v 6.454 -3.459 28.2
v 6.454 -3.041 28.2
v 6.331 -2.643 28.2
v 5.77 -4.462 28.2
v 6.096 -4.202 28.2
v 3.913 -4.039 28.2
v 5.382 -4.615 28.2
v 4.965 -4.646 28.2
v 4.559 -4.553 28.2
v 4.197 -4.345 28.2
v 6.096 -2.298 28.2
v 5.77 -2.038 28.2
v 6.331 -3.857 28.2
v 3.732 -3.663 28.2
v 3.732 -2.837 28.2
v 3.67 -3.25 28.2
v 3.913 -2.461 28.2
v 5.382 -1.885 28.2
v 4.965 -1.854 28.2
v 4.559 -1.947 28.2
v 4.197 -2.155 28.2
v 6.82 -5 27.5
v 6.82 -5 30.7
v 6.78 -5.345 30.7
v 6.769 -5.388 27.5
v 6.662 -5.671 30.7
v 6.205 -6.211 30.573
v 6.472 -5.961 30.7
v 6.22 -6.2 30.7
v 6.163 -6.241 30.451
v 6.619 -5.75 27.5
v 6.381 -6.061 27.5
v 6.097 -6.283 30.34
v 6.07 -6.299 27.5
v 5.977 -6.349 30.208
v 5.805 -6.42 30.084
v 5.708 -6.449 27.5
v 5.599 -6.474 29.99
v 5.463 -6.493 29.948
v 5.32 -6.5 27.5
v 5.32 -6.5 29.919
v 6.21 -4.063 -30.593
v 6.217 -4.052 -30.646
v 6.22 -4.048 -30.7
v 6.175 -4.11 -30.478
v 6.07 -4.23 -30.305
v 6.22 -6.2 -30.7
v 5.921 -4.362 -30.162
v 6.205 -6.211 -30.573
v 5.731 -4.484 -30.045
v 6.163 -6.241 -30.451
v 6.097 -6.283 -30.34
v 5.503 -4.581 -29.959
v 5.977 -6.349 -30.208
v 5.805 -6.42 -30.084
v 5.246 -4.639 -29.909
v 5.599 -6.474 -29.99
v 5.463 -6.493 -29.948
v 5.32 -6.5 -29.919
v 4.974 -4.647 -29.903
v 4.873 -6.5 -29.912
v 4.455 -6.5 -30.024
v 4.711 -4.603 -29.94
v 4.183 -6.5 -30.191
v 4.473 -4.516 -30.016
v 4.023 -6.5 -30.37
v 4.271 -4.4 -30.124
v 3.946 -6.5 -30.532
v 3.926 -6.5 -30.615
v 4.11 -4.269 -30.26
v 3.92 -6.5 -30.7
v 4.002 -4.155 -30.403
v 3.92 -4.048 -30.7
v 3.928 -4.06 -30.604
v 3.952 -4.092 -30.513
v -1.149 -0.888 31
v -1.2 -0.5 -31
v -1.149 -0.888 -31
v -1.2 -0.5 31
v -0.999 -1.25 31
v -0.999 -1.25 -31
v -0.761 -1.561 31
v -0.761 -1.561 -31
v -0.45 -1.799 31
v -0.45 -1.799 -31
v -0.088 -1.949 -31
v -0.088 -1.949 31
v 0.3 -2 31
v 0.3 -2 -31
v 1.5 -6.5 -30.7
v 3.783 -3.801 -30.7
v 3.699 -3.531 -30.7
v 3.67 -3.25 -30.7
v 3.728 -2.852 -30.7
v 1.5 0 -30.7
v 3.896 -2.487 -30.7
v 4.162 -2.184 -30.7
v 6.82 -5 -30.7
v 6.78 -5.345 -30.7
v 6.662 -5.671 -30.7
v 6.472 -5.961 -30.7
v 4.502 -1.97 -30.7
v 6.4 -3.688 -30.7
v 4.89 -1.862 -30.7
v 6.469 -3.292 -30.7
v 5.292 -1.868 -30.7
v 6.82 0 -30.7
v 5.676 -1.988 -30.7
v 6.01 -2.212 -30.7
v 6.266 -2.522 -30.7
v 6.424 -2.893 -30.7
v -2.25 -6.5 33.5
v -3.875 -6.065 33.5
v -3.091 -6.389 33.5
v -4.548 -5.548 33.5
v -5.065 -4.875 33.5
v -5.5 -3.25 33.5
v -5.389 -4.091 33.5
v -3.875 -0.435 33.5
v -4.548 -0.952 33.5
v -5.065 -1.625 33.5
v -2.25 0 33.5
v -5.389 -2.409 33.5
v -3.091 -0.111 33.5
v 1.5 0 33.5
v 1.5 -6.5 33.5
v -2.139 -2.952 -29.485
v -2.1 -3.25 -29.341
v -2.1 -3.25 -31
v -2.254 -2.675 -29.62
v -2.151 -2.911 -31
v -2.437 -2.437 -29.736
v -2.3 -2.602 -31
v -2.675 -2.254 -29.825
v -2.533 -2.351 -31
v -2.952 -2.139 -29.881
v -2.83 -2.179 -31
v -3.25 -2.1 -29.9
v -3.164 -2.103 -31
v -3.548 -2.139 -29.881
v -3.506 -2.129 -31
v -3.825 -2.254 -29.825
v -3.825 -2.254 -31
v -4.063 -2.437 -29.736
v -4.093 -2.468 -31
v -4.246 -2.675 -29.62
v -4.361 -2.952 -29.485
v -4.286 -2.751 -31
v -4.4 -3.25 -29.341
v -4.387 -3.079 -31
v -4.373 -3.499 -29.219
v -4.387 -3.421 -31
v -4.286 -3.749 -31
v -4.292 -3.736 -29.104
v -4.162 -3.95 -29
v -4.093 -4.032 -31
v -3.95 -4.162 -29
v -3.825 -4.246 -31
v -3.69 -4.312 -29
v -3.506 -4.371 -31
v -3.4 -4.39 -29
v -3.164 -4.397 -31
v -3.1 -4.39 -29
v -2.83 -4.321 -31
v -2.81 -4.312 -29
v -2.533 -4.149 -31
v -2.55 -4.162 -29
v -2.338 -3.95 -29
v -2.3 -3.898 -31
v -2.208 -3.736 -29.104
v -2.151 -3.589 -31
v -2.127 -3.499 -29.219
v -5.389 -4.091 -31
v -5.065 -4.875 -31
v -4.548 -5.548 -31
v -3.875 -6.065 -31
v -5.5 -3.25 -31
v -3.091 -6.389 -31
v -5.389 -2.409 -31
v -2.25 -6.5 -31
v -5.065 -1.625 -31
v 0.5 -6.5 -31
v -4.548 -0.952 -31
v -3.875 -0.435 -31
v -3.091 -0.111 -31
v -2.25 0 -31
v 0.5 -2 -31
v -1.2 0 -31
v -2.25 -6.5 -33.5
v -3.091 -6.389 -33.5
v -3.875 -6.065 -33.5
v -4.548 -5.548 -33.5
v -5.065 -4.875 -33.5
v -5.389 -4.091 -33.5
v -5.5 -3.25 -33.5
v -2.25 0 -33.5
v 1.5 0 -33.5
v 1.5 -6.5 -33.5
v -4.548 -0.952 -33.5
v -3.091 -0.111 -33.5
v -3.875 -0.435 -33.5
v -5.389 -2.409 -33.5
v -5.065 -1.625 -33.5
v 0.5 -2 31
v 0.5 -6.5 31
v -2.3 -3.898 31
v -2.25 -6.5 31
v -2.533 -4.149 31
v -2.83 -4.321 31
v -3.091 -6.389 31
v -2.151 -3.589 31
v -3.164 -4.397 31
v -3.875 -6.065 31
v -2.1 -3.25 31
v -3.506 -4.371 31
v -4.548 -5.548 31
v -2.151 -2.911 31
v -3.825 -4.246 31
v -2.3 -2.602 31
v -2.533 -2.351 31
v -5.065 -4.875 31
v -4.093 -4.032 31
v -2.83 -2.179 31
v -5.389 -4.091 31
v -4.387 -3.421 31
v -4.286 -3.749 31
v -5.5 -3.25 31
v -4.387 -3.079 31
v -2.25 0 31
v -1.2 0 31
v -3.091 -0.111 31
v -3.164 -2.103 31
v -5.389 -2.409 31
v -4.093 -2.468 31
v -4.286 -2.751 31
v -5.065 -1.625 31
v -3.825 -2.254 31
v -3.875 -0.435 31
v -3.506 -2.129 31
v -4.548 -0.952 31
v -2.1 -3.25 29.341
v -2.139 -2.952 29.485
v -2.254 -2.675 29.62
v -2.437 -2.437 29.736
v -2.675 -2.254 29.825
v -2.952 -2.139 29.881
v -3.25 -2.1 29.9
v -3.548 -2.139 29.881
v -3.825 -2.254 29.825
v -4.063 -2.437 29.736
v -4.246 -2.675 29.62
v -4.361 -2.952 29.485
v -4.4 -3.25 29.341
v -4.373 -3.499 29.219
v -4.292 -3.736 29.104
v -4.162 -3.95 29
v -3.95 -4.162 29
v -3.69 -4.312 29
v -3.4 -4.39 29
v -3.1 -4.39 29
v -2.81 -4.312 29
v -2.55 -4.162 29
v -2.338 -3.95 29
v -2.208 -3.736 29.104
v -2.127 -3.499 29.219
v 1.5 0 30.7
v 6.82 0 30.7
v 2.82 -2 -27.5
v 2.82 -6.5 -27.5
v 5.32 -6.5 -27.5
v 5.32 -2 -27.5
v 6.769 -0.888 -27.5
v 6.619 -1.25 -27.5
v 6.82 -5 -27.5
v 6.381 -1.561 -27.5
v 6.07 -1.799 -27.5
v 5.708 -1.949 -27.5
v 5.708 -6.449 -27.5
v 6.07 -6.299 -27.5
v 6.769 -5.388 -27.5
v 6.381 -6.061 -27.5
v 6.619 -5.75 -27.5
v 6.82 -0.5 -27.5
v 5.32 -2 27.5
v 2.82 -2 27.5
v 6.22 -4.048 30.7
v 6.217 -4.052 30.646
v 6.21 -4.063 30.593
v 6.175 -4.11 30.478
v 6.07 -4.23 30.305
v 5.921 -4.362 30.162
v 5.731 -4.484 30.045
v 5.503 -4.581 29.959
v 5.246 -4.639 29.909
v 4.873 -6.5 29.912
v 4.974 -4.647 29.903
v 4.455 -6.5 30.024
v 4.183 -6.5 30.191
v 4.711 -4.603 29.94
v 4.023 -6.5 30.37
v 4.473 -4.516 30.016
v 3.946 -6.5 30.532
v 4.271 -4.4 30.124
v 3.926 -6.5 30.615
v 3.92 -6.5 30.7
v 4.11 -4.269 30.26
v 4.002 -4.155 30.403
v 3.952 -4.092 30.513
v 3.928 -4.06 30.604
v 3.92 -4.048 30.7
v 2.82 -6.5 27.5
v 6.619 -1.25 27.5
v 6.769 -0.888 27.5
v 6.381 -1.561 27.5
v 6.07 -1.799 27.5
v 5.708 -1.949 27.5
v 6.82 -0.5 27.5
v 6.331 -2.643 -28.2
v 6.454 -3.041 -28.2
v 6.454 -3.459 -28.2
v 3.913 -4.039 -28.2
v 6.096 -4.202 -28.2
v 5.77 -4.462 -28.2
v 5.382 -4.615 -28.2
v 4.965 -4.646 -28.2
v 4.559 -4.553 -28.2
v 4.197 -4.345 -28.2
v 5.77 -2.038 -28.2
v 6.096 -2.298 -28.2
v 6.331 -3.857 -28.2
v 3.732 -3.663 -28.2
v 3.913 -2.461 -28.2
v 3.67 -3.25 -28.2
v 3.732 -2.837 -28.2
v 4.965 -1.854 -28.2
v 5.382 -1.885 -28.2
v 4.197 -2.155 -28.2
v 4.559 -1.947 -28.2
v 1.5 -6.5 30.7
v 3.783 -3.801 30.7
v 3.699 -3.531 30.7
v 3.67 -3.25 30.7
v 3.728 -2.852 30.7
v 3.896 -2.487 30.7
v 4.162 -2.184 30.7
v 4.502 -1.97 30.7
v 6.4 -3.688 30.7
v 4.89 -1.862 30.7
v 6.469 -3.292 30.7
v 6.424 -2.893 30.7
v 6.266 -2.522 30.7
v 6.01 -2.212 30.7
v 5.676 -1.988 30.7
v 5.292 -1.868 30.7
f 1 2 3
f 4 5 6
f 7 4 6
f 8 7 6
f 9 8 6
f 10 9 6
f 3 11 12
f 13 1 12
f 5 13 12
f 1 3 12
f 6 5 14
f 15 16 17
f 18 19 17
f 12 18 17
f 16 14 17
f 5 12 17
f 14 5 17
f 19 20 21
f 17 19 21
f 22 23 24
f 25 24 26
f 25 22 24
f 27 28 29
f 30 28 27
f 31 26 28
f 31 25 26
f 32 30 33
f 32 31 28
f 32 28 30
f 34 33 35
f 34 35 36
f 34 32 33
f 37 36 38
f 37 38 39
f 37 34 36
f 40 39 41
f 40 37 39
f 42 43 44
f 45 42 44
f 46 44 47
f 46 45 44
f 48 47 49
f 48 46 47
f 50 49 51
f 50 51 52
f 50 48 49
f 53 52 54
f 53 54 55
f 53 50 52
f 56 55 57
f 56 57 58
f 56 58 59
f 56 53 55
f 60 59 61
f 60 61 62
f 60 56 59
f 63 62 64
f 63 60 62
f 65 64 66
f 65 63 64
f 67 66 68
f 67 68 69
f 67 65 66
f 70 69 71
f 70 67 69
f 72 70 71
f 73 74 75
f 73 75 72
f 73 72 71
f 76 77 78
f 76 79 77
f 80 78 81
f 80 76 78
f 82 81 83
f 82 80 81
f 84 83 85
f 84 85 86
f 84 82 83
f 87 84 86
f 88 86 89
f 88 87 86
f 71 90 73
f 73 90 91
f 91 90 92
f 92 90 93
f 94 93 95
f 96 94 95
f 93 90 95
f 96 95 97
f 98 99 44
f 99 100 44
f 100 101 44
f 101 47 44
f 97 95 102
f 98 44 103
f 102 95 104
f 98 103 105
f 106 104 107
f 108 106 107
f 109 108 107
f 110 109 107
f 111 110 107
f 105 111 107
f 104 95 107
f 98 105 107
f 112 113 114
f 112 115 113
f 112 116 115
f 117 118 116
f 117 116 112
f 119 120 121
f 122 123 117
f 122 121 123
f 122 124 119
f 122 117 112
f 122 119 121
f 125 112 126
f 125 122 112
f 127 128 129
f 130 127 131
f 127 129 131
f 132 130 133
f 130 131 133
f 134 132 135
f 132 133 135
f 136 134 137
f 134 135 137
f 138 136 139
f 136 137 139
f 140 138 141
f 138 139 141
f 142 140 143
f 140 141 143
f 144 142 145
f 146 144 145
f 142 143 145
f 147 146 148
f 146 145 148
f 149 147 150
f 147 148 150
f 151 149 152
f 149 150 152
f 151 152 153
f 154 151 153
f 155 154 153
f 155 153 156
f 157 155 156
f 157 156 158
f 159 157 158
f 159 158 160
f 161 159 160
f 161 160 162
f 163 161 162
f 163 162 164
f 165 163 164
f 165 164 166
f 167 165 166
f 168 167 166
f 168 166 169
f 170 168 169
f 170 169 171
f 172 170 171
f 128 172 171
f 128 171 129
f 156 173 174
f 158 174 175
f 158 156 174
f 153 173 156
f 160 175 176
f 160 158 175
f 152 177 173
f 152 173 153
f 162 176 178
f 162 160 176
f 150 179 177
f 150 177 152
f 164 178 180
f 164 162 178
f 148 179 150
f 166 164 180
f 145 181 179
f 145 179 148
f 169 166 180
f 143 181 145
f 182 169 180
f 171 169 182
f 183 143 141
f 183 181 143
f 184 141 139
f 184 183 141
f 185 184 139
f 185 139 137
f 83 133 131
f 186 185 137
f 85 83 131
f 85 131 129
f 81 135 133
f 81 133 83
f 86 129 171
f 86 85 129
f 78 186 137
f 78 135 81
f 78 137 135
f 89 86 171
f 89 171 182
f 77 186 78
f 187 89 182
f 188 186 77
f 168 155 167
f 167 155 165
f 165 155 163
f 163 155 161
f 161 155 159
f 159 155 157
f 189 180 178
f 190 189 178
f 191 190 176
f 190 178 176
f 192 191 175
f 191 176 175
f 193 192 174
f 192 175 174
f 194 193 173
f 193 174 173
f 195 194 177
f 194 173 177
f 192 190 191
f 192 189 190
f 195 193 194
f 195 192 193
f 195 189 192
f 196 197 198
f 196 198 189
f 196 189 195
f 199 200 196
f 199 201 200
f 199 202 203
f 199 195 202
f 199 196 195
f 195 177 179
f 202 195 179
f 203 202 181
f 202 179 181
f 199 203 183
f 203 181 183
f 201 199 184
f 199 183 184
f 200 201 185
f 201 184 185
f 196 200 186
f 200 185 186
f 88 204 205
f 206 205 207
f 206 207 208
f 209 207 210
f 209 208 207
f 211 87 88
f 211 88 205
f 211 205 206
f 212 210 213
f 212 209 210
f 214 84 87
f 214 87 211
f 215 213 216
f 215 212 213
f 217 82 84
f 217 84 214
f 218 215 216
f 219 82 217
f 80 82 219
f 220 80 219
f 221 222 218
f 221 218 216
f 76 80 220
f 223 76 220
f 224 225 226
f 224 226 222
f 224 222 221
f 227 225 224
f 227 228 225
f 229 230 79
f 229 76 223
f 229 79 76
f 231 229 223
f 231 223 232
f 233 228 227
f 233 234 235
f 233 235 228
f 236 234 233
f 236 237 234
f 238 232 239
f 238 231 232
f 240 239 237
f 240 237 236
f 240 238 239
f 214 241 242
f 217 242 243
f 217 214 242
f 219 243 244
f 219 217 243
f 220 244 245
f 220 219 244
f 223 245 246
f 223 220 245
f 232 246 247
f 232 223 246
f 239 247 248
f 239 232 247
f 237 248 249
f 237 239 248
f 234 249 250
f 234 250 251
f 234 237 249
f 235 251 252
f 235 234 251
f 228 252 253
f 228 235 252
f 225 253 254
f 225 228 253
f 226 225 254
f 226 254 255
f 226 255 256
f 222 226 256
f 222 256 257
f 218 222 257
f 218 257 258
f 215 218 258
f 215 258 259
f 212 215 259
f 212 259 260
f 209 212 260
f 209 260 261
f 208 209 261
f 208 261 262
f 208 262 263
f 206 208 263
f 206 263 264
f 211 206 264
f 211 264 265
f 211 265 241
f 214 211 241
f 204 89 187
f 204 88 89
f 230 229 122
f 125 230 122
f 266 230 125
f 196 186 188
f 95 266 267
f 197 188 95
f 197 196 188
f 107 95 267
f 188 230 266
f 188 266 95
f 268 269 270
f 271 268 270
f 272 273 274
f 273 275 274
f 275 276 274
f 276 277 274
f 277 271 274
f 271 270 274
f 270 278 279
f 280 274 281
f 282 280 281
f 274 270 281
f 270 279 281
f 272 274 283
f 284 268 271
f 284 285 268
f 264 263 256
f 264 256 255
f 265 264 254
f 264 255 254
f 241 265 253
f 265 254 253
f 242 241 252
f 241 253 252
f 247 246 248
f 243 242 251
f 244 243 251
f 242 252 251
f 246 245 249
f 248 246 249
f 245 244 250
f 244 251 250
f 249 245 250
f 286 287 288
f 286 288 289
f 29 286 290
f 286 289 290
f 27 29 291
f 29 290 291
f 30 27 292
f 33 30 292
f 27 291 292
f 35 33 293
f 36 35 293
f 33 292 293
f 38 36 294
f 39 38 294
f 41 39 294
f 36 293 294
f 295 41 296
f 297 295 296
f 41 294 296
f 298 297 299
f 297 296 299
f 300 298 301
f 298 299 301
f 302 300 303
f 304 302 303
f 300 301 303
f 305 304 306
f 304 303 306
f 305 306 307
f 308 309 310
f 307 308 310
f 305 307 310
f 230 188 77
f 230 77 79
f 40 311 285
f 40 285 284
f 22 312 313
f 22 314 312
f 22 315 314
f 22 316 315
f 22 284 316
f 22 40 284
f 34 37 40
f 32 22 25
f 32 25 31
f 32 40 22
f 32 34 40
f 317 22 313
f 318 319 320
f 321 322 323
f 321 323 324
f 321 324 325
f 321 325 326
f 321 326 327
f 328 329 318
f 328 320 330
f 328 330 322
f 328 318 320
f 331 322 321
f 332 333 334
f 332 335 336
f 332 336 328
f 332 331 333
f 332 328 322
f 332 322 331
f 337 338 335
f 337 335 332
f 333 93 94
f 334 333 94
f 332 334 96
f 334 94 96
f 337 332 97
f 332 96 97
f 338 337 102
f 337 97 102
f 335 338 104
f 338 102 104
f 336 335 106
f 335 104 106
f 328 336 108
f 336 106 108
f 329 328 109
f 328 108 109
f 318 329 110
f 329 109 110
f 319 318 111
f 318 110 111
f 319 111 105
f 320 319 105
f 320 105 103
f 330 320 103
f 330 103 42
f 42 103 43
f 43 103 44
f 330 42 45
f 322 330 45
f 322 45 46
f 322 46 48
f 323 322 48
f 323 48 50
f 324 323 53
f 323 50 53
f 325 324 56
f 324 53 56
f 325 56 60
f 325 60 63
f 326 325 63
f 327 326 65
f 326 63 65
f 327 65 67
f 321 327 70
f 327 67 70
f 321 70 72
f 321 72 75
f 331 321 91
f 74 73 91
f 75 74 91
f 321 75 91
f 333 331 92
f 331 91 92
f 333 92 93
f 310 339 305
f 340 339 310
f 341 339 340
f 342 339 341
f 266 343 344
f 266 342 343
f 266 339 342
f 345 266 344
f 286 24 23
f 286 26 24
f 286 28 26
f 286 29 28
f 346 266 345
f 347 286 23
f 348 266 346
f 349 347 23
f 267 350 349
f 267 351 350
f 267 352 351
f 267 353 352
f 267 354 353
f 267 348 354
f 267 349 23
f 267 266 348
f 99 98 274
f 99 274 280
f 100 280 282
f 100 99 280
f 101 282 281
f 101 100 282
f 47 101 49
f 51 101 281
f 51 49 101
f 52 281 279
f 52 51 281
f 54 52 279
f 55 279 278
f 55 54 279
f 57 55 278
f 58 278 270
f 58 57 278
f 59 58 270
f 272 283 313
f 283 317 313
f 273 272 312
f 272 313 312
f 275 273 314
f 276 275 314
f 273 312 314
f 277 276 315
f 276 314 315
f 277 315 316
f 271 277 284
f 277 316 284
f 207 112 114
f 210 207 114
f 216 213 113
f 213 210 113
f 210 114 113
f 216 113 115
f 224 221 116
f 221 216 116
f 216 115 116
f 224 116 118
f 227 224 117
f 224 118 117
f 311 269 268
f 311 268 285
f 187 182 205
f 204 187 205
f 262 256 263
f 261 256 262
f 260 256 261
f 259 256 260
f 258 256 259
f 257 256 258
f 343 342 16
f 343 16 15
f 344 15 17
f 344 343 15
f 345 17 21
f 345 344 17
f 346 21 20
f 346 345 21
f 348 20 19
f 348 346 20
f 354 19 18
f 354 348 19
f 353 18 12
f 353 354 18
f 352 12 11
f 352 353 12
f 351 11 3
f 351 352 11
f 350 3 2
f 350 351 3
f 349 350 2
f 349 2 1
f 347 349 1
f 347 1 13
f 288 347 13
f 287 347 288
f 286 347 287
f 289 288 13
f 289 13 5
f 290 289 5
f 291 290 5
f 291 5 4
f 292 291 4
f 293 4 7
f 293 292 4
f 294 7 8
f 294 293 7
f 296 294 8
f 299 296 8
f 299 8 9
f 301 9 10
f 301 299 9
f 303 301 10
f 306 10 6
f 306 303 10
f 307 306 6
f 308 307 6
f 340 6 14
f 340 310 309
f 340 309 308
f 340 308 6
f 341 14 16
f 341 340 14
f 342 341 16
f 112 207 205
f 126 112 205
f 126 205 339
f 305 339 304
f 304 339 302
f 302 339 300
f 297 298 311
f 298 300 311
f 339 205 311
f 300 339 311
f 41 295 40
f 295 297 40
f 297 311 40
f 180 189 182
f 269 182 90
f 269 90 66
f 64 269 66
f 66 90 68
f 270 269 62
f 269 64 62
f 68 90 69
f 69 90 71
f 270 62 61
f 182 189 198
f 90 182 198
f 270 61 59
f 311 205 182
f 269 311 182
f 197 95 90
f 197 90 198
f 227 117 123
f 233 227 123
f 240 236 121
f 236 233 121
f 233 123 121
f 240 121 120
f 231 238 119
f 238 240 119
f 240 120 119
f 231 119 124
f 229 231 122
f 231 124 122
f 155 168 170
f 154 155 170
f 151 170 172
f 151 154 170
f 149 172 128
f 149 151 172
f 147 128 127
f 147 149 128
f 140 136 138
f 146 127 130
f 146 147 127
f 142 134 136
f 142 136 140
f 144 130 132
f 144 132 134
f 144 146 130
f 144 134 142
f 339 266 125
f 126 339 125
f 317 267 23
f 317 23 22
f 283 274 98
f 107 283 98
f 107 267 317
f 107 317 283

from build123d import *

# Parameters (mm, degrees)
BOSS_EXTRUDE1_DEPTH = 6.5
CUT_EXTRUDE3_DEPTH  = 68.659163459
SKETCH4_W           = 4
SKETCH4_H           = 55
SKETCH4_W_2         = 1.7
SKETCH4_H_2         = 62
CUT_EXTRUDE4_DEPTH  = 4.5
SKETCH5_R           = 1.15
BOSS_EXTRUDE2_DEPTH = 2
FILLET1_R           = 1.5
CUT_EXTRUDE5_REACH  = 36.8
SKETCH7_W           = 5.32
SKETCH7_H           = 0.3
SKETCH6_R           = 1.4
CUT_EXTRUDE6_DEPTH  = 2.8
FILLET2_R           = 1.5
FILLET3_R           = 1.5
CUT_EXTRUDE7_REACH  = 37.922
CUT_EXTRUDE8_START  = -2.451564
SKETCH10_RX         = 1.15
SKETCH10_RY         = 0.8
CUT_EXTRUDE8_DEPTH  = 2.451564


with BuildPart() as part:
    # Sketch1 → Boss-Extrude1 (new body)
    with BuildSketch(Plane(origin=(0, 0, 0), x_dir=(1, 0, 0), z_dir=(0, 1, 0))):
        Polygon((1.5, -31), (6.82, -31), (6.82, 31), (1.5, 31), (1.5, 33.5), (-5.5, 33.5), (-5.5, 31), (-1.2, 31), (-1.2, -31), (-5.5, -31), (-5.5, -33.5), (1.5, -33.5), align=None)
    extrude(amount=-BOSS_EXTRUDE1_DEPTH)

    # Sketch3 → Cut-Extrude3 (cut, through all)
    with BuildSketch(Plane.XY.offset(33.5)):
        with BuildLine():
            Line((-5.5, 0), (-5.5, -3.25))
            ThreePointArc((-5.5, -3.25), (-4.548097039, -0.951902961), (-2.25, 0))
            Line((-2.25, 0), (-5.5, 0))
        make_face()
        with BuildLine():
            Line((-5.5, -6.5), (-2.25, -6.5))
            ThreePointArc((-2.25, -6.5), (-4.548097039, -5.548097039), (-5.5, -3.25))
            Line((-5.5, -3.25), (-5.5, -6.5))
        make_face()
    extrude(amount=-CUT_EXTRUDE3_DEPTH, mode=Mode.SUBTRACT)

    # Sketch4 → Cut-Extrude4 (cut)
    with BuildSketch(Plane.XZ.offset(6.5)):
        with Locations((4.82, 0)):
            Rectangle(SKETCH4_W, SKETCH4_H)
        with Locations((-0.35, 0)):
            Rectangle(SKETCH4_W_2, SKETCH4_H_2)
    extrude(amount=-CUT_EXTRUDE4_DEPTH, mode=Mode.SUBTRACT)

    # Sketch5 → Boss-Extrude2 (add)
    with BuildSketch(Plane.XY.offset(-31)):
        with Locations((-3.25, -3.25)):
            Circle(SKETCH5_R)
    boss_extrude2 = extrude(amount=BOSS_EXTRUDE2_DEPTH)

    # Fillet1
    fillet1_edges = [part.edges().sort_by_distance(p)[0] for p in [
        (-1.2, -2, 0),
    ]]
    fillet(fillet1_edges, radius=FILLET1_R)

    # Sketch7 → Cut-Extrude5 (cut, up to next)
    with BuildSketch(Plane(origin=(0, 0, 0), x_dir=(1, 0, 0), z_dir=(0, 1, 0)), mode=Mode.PRIVATE) as cut_extrude5_sk1:
        with Locations((4.16, 30.85)):
            Rectangle(SKETCH7_W, SKETCH7_H)
    cut_extrude5_tool1 = extrude(cut_extrude5_sk1.sketch, amount=-CUT_EXTRUDE5_REACH, mode=Mode.PRIVATE) & part.part
    cut_extrude5 = cut_extrude5_tool1.solids().sort_by_distance((4.16, 0, -30.85))[0]
    add(cut_extrude5, mode=Mode.SUBTRACT)

    # Sketch6 → Cut-Extrude6 (cut)
    with BuildSketch(Plane(origin=(0, 0, -31), x_dir=(-1, 0, 0), z_dir=(0, 0, -1))):
        with Locations((-5.07, -3.25)):
            Circle(SKETCH6_R)
    cut_extrude6 = extrude(amount=-CUT_EXTRUDE6_DEPTH, mode=Mode.SUBTRACT)

    # Mirror2: Boss-Extrude2, Cut-Extrude5, Cut-Extrude6 across plane
    add(boss_extrude2.mirror(Plane.XY))
    add(cut_extrude5.mirror(Plane.XY), mode=Mode.SUBTRACT)
    add(cut_extrude6.mirror(Plane.XY), mode=Mode.SUBTRACT)

    # Fillet2
    fillet2_edges = [part.edges().sort_by_distance(p)[0] for p in [
        (6.82, -2, 0),
    ]]
    fillet(fillet2_edges, radius=FILLET2_R)

    # Fillet3
    fillet3_edges = [part.edges().sort_by_distance(p)[0] for p in [
        (6.82, -6.5, 29.1),
        (6.82, -6.5, -29.1),
    ]]
    fillet(fillet3_edges, radius=FILLET3_R)

    # Sketch9 → Cut-Extrude7 (cut, up to next)
    with BuildSketch(Plane.ZY.offset(4.4), mode=Mode.PRIVATE) as cut_extrude7_sk1:
        Polygon((-29, -3.95), (-29.9, -2.1), (-29, -2.1), align=None)
    cut_extrude7_tool1 = extrude(cut_extrude7_sk1.sketch, amount=-CUT_EXTRUDE7_REACH, mode=Mode.PRIVATE) & part.part
    cut_extrude7 = cut_extrude7_tool1.solids().sort_by_distance((-4.4, -2.716667, -29.3))[0]
    add(cut_extrude7, mode=Mode.SUBTRACT)

    # Sketch10 → Cut-Extrude8 (cut)
    with BuildSketch(Plane.XZ.offset(6.5).offset(CUT_EXTRUDE8_START)):
        with Locations(Location((5.07, -30.7), (0, 0, 180))):
            Ellipse(SKETCH10_RX, SKETCH10_RY)
    cut_extrude8 = extrude(amount=CUT_EXTRUDE8_DEPTH, mode=Mode.SUBTRACT)

    # Mirror3: Cut-Extrude7, Cut-Extrude8 across plane
    add(cut_extrude7.mirror(Plane.XY), mode=Mode.SUBTRACT)
    add(cut_extrude8.mirror(Plane.XY), mode=Mode.SUBTRACT)


solid = part.part
